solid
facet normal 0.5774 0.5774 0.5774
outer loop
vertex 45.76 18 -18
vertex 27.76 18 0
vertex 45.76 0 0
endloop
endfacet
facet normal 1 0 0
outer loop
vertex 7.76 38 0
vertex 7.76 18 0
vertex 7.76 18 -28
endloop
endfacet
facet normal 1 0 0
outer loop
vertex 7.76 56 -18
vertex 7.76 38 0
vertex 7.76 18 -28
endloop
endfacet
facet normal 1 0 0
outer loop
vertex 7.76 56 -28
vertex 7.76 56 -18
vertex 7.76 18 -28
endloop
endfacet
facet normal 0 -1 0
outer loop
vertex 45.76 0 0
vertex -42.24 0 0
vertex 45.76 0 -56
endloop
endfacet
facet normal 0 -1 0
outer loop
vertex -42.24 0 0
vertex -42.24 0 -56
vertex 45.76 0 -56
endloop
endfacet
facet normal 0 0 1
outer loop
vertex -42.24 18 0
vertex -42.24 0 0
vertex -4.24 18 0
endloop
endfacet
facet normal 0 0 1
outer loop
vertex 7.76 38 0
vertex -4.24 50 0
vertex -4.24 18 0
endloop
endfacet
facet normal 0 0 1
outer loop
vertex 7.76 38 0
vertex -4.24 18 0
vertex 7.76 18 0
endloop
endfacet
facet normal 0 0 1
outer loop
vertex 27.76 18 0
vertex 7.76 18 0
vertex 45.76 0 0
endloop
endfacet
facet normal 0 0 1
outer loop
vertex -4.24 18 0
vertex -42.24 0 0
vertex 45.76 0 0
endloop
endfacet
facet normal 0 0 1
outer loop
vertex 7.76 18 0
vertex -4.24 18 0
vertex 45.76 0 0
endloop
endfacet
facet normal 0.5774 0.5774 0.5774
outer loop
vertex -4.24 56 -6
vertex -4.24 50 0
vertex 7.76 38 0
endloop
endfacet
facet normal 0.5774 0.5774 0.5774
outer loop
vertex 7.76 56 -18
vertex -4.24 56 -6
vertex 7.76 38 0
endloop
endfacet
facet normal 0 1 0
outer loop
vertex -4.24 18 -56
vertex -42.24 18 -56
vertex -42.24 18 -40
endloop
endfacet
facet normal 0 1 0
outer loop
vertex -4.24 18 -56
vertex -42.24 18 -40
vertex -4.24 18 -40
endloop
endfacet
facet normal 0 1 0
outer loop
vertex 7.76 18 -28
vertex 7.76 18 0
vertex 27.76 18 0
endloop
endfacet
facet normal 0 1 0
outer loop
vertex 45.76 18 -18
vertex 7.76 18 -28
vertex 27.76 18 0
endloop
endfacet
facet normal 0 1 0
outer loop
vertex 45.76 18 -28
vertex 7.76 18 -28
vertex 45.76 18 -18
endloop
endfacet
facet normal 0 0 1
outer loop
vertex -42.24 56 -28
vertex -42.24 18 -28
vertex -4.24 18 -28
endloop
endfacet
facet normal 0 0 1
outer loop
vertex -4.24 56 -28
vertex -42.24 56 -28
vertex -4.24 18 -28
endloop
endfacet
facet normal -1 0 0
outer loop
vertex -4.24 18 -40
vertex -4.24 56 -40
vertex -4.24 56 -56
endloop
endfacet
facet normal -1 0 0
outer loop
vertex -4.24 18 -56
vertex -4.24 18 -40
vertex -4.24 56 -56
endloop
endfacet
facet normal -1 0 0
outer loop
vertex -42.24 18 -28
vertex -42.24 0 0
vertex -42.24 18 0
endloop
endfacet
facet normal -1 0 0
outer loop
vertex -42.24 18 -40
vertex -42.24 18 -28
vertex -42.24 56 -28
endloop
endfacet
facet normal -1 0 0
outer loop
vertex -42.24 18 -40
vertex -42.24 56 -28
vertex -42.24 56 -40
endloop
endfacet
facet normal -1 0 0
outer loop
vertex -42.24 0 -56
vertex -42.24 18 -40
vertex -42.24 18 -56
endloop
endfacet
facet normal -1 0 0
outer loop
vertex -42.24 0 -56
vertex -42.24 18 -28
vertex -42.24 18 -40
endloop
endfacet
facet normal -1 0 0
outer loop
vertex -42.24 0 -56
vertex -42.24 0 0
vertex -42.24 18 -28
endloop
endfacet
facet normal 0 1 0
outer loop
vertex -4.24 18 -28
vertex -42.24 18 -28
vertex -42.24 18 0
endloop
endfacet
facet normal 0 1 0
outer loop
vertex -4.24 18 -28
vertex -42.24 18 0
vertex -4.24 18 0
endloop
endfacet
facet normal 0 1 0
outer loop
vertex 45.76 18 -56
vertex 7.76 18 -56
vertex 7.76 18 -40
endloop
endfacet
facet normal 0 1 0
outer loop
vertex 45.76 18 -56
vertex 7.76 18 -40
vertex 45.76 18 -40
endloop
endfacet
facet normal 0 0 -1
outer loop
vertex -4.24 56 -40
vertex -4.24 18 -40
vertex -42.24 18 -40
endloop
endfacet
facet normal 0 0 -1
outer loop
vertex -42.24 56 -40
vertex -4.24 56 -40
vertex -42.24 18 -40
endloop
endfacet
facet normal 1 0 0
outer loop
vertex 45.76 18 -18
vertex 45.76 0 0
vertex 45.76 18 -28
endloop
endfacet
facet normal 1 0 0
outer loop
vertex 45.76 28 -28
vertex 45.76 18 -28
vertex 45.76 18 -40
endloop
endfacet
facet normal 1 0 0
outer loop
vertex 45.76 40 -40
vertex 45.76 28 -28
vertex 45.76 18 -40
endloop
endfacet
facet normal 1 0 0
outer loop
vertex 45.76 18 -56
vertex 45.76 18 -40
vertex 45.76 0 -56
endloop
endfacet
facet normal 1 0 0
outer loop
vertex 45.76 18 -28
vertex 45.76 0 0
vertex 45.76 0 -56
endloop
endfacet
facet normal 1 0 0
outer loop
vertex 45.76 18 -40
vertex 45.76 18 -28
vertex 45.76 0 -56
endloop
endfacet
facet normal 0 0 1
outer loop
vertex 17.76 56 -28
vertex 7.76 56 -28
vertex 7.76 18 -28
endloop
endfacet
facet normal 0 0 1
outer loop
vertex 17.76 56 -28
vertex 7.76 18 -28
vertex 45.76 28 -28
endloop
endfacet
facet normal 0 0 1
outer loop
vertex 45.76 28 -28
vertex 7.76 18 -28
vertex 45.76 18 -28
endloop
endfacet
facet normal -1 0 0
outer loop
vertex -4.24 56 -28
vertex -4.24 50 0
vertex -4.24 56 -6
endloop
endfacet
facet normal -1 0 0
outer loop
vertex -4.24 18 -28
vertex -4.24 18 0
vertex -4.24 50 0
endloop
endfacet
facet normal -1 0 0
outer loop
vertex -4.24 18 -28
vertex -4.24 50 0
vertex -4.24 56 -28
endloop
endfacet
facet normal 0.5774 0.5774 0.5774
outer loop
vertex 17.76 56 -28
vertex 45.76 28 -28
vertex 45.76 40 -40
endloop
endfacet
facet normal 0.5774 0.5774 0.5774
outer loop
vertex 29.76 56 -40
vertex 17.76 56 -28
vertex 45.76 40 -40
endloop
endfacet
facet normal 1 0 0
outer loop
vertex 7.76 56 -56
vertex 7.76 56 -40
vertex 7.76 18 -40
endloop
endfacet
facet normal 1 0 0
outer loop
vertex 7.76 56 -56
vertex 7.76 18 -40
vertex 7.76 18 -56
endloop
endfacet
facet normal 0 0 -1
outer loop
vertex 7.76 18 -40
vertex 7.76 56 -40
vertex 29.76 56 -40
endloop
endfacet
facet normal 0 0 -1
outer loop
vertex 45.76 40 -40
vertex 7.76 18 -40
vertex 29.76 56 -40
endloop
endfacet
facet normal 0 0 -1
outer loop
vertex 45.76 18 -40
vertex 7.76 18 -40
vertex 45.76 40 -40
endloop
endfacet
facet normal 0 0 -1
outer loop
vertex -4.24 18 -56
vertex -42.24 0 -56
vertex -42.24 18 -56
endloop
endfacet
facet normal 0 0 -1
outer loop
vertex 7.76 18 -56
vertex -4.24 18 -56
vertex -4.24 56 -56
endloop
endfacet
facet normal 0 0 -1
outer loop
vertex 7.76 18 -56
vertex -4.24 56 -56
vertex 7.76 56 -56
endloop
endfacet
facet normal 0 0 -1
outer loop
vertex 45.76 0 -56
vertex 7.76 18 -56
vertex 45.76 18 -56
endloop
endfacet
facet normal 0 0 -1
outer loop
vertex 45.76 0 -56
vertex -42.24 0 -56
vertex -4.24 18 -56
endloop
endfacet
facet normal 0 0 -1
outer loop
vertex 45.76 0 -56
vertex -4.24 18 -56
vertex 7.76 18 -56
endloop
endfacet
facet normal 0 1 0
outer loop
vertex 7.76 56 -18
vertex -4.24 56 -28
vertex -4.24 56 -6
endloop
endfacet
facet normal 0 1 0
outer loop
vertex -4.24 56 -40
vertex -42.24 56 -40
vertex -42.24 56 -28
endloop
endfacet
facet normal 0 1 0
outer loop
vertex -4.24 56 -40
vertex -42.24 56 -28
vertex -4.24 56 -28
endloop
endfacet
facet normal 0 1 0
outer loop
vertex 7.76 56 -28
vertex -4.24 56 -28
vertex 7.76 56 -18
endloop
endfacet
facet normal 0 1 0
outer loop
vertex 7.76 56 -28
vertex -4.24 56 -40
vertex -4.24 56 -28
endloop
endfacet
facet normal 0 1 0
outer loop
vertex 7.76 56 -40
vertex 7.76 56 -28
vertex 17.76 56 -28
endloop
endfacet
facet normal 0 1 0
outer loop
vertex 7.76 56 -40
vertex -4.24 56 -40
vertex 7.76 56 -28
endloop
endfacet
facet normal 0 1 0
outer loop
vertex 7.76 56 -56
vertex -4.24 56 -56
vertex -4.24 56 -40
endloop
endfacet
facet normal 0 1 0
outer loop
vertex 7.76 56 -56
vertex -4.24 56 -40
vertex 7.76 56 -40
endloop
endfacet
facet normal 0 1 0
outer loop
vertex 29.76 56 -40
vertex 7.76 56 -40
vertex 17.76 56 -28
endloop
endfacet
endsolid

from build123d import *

# Parameters (mm, degrees)
SKETCH1_W           = 88
SKETCH1_H           = 56
BOSS_EXTRUDE1_DEPTH = 18
BOSS_EXTRUDE2_DEPTH = 56
SKETCH4_W           = 161.292605704
SKETCH4_H           = 128.574655565
CUT_EXTRUDE1_DEPTH  = 56


with BuildPart() as part:
    # Sketch1 → Boss-Extrude1 (new body)
    with BuildSketch(Plane(origin=(0, 0, 0), x_dir=(1, 0, 0), z_dir=(0, 1, 0))):
        with Locations((1.76, 28)):
            Rectangle(SKETCH1_W, SKETCH1_H)
    extrude(amount=BOSS_EXTRUDE1_DEPTH)

    # Sketch1<3> → Boss-Extrude2 (add)
    with BuildSketch(Plane(origin=(0, 0, 0), x_dir=(1, 0, 0), z_dir=(0, 1, 0))):
        Polygon((-42.24, 40), (-42.24, 28), (-4.24, 28), (-4.24, 0), (7.76, 0), (7.76, 28), (45.76, 28), (45.76, 40), (7.76, 40), (7.76, 56), (-4.24, 56), (-4.24, 40), align=None)
    extrude(amount=BOSS_EXTRUDE2_DEPTH)

    # Sketch4 → Cut-Extrude1 (cut)
    with BuildSketch(Plane(origin=(15.253333333, 15.253333333, 15.253333333), x_dir=(0.40824829046386324, 0.40824829046386196, -0.8164965809277265), z_dir=(0.5773502691896268, 0.5773502691896253, 0.5773502691896252))):
        with Locations((33.378380228, 7.240773439)):
            Rectangle(SKETCH4_W, SKETCH4_H)
    extrude(amount=CUT_EXTRUDE1_DEPTH, mode=Mode.SUBTRACT)


solid = part.part
